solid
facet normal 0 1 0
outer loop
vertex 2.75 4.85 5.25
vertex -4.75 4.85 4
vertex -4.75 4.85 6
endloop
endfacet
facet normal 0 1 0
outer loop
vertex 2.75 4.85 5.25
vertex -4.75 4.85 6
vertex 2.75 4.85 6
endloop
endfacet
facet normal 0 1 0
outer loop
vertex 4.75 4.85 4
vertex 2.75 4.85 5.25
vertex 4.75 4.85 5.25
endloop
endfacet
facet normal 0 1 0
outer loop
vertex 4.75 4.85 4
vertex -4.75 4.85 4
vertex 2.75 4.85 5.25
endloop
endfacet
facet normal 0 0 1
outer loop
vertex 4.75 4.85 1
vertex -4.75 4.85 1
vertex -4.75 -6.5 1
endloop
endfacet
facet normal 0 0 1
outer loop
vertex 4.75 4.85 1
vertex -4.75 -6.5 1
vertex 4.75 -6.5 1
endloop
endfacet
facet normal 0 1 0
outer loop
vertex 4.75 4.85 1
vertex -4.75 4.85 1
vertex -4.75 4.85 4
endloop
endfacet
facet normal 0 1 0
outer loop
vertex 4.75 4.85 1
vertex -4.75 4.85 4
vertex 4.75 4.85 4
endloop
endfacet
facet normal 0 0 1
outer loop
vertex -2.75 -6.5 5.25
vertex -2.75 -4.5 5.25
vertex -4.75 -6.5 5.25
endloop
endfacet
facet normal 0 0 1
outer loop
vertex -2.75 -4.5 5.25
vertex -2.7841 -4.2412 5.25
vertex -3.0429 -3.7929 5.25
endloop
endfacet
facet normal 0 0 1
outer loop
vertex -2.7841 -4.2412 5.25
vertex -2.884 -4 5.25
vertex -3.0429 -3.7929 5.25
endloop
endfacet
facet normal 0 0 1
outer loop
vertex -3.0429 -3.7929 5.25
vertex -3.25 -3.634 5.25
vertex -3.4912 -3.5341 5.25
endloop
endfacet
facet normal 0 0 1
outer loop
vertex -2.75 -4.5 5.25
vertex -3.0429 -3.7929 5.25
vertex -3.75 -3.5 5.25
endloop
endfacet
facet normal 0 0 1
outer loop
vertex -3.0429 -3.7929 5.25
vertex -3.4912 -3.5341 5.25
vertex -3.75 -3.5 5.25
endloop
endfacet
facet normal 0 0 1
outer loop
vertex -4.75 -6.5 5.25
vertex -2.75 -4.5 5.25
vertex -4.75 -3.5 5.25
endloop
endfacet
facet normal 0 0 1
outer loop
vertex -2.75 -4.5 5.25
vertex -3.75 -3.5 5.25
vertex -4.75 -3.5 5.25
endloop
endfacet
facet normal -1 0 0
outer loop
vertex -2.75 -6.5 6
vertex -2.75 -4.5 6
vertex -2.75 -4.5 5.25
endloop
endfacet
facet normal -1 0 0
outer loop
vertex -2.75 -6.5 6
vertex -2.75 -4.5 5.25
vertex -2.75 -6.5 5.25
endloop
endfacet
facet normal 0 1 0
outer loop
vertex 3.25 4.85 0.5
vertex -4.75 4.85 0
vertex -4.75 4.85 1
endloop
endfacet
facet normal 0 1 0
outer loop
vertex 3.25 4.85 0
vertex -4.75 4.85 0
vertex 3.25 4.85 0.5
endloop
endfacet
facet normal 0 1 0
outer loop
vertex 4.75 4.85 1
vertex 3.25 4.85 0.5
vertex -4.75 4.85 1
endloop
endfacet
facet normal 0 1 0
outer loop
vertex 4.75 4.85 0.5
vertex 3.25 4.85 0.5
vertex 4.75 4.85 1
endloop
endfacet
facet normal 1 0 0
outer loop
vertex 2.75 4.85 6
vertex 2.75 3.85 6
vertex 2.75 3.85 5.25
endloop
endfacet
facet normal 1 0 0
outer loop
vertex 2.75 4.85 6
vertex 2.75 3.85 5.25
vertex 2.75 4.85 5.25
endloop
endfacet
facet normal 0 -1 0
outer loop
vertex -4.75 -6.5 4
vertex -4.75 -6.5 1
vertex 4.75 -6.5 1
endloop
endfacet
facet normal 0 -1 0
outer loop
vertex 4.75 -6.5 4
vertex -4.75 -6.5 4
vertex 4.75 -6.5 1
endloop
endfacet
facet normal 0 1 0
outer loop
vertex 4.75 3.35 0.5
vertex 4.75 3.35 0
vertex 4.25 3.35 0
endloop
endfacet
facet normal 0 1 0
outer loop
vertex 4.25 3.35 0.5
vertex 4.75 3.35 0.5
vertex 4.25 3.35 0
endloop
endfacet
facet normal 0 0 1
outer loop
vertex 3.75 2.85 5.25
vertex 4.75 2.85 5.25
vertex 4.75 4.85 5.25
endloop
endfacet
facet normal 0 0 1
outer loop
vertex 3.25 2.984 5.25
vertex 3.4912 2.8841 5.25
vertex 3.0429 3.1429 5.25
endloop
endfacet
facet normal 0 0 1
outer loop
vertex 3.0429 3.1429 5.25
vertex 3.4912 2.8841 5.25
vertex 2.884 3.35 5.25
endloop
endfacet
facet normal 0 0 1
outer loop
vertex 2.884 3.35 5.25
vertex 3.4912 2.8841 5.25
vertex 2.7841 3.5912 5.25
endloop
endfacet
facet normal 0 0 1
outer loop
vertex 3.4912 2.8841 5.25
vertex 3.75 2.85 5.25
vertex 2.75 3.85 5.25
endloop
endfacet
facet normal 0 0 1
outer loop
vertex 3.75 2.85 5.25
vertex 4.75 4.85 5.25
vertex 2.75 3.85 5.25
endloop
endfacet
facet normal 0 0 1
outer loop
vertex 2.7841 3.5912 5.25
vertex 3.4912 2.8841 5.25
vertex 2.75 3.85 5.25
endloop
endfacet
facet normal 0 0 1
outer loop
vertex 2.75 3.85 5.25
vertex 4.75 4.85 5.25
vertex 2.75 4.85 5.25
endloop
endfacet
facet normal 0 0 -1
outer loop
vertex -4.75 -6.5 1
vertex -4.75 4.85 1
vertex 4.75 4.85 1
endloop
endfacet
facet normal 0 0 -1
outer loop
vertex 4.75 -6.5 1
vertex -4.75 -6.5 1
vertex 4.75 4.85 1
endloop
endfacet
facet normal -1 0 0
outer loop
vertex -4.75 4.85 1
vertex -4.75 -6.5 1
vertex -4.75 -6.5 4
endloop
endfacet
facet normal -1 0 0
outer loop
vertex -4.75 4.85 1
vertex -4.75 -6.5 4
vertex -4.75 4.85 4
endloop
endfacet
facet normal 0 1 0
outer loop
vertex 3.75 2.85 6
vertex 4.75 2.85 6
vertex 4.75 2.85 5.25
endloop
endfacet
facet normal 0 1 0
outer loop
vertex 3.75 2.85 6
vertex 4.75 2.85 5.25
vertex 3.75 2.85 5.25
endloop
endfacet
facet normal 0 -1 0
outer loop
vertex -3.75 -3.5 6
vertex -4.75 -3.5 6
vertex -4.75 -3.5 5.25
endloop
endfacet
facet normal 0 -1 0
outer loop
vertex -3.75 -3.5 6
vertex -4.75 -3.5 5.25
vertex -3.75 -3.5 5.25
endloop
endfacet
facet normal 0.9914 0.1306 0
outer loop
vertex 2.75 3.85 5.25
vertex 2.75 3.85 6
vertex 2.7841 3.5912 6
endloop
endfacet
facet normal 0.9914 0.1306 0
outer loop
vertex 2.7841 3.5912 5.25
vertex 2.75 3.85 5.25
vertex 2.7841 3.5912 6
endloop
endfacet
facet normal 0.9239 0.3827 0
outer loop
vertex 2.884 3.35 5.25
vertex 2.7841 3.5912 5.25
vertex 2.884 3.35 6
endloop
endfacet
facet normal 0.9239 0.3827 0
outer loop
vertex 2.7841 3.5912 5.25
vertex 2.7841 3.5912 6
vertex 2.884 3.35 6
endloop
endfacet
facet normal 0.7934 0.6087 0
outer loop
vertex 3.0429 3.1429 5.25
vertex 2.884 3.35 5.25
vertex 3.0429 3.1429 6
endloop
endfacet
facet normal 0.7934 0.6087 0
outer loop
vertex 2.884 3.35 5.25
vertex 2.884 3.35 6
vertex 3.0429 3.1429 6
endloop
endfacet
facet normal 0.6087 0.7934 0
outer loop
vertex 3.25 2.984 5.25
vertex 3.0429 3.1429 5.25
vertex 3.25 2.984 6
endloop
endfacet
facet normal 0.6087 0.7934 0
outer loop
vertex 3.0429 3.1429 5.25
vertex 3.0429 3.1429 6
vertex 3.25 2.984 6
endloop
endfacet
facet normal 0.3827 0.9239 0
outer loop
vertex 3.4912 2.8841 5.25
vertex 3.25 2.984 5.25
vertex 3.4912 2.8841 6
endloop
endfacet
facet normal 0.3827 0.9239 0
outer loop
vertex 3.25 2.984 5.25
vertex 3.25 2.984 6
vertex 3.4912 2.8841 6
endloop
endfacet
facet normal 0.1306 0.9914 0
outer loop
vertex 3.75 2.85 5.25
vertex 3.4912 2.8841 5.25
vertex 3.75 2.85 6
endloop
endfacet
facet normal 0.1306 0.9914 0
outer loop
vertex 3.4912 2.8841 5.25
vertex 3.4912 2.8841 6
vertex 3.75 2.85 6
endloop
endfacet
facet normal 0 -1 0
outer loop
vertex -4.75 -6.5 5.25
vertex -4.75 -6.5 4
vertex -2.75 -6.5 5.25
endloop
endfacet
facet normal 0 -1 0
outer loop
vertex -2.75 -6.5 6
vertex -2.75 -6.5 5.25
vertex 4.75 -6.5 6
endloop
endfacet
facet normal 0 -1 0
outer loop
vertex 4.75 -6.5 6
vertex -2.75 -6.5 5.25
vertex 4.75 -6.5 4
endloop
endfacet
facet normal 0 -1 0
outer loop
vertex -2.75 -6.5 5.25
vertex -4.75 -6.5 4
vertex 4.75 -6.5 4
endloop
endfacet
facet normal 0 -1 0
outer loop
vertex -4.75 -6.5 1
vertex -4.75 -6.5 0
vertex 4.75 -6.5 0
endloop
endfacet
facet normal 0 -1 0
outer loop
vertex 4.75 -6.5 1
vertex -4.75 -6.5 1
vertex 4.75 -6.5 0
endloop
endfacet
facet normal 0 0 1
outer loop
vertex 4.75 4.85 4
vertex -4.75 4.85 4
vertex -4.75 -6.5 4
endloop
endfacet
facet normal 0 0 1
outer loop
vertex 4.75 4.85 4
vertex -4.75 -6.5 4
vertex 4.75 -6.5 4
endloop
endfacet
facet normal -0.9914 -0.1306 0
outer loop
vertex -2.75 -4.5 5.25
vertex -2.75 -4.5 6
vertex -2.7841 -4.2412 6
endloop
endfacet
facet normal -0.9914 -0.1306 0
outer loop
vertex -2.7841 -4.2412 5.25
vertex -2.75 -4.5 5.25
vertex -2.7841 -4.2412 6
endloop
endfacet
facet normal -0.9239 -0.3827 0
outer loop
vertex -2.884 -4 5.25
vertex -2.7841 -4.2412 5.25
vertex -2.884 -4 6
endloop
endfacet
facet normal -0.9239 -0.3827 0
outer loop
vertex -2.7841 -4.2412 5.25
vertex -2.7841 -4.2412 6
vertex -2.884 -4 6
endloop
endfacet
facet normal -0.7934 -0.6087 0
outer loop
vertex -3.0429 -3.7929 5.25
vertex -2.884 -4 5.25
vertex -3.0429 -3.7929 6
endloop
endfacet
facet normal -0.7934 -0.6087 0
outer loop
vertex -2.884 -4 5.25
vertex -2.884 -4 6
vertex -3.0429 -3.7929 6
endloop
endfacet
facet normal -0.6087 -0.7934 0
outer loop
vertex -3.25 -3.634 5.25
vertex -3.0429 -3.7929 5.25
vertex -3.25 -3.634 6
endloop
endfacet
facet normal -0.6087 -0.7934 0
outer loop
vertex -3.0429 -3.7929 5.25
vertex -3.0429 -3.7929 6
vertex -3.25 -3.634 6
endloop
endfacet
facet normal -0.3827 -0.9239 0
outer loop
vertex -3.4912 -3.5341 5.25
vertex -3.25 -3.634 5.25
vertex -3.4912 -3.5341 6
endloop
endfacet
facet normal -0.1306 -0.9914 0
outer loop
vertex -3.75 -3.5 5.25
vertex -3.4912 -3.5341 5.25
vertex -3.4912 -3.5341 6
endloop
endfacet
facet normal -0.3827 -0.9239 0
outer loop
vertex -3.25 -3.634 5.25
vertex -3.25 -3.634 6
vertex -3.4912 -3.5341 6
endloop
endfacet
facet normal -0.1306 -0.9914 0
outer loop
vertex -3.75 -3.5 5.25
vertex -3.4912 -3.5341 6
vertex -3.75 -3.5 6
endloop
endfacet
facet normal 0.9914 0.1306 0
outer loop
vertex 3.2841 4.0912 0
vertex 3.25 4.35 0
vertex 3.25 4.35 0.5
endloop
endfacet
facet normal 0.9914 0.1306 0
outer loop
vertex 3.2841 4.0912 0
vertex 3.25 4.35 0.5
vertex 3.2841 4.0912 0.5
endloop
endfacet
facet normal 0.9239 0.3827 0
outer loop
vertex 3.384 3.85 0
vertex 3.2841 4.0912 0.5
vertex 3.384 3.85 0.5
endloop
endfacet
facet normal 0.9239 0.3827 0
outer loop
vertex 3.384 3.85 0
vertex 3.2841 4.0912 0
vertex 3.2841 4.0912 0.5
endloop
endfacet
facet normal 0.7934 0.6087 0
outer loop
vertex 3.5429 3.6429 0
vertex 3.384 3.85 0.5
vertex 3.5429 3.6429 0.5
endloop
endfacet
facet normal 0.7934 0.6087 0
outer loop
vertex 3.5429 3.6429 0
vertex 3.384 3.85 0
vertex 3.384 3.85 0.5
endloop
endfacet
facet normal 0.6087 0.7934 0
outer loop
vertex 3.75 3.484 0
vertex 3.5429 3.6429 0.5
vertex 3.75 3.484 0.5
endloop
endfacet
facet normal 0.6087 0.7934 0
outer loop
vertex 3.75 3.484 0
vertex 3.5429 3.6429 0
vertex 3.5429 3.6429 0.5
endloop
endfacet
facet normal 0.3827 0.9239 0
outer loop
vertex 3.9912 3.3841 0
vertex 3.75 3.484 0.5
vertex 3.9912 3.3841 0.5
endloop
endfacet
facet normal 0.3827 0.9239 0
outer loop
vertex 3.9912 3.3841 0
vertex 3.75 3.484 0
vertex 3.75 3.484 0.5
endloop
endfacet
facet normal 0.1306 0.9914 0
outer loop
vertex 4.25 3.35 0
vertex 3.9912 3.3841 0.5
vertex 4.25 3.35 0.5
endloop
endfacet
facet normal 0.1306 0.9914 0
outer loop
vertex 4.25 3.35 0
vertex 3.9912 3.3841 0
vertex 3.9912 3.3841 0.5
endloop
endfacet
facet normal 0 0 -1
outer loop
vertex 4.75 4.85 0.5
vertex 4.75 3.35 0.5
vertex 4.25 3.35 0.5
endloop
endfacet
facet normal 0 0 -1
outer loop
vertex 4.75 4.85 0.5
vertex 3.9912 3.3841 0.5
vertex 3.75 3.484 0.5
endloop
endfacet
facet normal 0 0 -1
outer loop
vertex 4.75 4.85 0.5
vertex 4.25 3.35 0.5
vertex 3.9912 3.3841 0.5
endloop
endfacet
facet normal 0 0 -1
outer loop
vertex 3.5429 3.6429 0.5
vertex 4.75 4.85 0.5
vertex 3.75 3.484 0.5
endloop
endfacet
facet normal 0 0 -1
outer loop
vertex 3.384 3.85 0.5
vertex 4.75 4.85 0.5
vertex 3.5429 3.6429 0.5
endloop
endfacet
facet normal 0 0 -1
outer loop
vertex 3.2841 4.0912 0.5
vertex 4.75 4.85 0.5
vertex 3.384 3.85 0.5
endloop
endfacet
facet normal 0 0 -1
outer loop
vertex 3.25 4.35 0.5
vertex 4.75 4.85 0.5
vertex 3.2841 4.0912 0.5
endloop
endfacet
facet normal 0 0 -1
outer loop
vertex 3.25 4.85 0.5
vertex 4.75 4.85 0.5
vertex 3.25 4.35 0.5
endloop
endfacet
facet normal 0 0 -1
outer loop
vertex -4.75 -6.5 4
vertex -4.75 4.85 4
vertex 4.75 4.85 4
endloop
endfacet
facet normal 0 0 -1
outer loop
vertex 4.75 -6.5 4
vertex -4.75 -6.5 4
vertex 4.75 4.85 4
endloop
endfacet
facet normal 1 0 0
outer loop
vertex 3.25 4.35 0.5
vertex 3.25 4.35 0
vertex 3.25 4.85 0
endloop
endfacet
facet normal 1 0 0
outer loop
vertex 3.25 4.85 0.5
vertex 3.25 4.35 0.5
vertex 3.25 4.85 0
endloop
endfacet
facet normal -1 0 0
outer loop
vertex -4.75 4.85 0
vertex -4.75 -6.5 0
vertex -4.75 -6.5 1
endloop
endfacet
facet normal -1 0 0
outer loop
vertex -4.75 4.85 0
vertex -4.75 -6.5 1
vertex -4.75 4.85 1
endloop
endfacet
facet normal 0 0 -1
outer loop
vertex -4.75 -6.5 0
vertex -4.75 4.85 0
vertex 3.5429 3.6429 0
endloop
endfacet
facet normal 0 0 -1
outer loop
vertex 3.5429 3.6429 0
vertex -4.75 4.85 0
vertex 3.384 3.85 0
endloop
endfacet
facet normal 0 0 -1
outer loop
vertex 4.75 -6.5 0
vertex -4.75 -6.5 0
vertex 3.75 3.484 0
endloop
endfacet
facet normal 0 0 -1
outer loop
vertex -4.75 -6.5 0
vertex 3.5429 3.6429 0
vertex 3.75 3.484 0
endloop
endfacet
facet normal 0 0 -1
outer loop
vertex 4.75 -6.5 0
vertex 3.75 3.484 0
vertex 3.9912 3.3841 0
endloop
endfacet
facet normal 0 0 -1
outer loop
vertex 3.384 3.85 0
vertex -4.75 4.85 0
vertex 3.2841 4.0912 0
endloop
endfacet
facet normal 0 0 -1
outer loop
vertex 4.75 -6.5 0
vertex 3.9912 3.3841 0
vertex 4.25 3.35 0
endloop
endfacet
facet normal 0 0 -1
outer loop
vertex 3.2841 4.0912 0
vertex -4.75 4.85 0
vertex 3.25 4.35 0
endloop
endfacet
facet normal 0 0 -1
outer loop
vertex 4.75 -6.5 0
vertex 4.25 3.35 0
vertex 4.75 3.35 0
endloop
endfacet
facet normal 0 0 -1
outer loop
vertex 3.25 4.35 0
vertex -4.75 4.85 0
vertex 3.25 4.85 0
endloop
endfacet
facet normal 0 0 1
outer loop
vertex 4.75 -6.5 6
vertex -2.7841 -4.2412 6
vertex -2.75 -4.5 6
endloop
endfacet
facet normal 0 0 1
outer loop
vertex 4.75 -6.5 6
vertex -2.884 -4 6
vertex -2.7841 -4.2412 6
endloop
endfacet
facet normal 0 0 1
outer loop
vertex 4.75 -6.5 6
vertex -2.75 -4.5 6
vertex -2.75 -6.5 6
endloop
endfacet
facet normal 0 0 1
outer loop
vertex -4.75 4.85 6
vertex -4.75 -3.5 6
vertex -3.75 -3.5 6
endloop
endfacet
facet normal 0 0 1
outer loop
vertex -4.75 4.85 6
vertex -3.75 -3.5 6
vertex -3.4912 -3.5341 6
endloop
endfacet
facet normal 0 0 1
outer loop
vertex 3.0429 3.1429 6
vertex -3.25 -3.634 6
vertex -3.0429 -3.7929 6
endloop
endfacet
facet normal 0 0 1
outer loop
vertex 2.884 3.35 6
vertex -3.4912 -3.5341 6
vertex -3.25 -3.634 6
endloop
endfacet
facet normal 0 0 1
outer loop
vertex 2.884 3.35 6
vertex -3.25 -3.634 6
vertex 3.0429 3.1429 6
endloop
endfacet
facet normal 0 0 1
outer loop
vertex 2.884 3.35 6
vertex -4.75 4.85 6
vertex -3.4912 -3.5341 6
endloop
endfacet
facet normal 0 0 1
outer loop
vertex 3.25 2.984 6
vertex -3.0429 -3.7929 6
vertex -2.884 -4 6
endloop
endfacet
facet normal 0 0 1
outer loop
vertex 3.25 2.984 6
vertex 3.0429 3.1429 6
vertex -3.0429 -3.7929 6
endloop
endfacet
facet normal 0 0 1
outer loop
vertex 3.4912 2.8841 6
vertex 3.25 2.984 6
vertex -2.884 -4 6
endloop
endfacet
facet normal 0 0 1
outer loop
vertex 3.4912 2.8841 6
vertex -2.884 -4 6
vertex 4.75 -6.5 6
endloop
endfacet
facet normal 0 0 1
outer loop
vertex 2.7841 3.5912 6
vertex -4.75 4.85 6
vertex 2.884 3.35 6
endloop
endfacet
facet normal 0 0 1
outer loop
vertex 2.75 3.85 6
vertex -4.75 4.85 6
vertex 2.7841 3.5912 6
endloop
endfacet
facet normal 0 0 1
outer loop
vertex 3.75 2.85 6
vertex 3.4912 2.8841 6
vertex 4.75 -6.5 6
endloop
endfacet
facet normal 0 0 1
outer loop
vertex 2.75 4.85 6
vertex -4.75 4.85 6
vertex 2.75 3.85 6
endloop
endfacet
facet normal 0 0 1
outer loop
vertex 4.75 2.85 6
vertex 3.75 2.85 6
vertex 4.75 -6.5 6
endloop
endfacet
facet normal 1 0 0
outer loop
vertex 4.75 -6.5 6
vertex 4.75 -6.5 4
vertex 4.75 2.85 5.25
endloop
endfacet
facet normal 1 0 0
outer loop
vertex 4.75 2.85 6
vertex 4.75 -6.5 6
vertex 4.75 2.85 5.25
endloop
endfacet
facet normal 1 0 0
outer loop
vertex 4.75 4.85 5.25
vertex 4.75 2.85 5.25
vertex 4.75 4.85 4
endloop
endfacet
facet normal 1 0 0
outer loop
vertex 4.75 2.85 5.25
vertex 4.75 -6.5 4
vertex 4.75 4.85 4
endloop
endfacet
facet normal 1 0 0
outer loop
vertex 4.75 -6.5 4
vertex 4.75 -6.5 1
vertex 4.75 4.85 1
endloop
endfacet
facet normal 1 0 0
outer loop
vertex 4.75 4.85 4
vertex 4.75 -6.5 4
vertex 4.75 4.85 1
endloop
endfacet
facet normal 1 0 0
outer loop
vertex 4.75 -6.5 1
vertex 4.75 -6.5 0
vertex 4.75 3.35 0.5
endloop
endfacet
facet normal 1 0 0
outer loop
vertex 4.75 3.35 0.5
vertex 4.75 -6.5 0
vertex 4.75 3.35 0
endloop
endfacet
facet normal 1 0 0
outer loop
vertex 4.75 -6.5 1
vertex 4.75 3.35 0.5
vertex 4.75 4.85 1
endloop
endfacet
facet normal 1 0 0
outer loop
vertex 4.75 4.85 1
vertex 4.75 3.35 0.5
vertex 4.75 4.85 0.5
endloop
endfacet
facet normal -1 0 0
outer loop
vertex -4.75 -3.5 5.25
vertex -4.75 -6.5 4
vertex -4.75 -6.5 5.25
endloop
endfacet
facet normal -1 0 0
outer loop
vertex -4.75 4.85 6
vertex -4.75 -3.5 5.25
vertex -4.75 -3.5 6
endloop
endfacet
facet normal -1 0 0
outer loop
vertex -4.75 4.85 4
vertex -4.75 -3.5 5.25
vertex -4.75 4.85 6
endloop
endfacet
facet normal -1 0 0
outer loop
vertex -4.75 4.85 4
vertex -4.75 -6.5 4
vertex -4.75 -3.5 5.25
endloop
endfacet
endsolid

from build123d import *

# Parameters (mm, degrees)
SKETCH_W        = 9.5
SKETCH_H        = 11.35
PAD_DEPTH       = 1
POCKET002_DEPTH = 0.5
SKETCH002_W     = 9.5
SKETCH002_H     = 11.35
PAD001_DEPTH    = 3
SKETCH001_W     = 9.5
SKETCH001_H     = 11.35
PAD002_DEPTH    = 2
POCKET_DEPTH    = 0.75
POCKET001_DEPTH = 0.75


with BuildPart() as housing_bottom:
    # Sketch → Pad (new body)
    with BuildSketch(Plane.XY):
        with Locations((0, -0.825)):
            Rectangle(SKETCH_W, SKETCH_H)
    extrude(amount=PAD_DEPTH)

    # Sketch005 → Pocket002 (cut)
    with BuildSketch(Plane.XY):
        with BuildLine():
            Line((3.25, 4.85), (4.75, 4.85))
            Line((4.75, 4.85), (4.75, 3.35))
            Line((4.75, 3.35), (4.25, 3.35))
            ThreePointArc((3.25, 4.35), (3.542893, 3.642893), (4.25, 3.35))
            Line((3.25, 4.35), (3.25, 4.85))
        make_face()
    extrude(amount=POCKET002_DEPTH, mode=Mode.SUBTRACT)


with BuildPart() as housing_middle:
    # Sketch002 → Pad001 (new body)
    with BuildSketch(Plane.XY.offset(1)):
        with Locations((0, -0.825)):
            Rectangle(SKETCH002_W, SKETCH002_H)
    extrude(amount=PAD001_DEPTH)


with BuildPart() as housing_top:
    # Sketch001 → Pad002 (new body)
    with BuildSketch(Plane.XY.offset(4)):
        with Locations((0, -0.825)):
            Rectangle(SKETCH001_W, SKETCH001_H)
    extrude(amount=PAD002_DEPTH)

    # Sketch003 → Pocket (cut)
    with BuildSketch(Plane.XY.offset(6)):
        with BuildLine():
            Line((2.75, 4.85), (4.75, 4.85))
            Line((4.75, 4.85), (4.75, 2.85))
            Line((4.75, 2.85), (3.75, 2.85))
            ThreePointArc((2.75, 3.85), (3.042893, 3.142893), (3.75, 2.85))
            Line((2.75, 3.85), (2.75, 4.85))
        make_face()
    extrude(amount=-POCKET_DEPTH, mode=Mode.SUBTRACT)

    # Sketch004 → Pocket001 (cut)
    with BuildSketch(Plane.XY.offset(6)):
        with BuildLine():
            Line((-4.75, -3.5), (-3.75, -3.5))
            ThreePointArc((-2.75, -4.5), (-3.042893, -3.792893), (-3.75, -3.5))
            Line((-2.75, -4.5), (-2.75, -6.5))
            Line((-2.75, -6.5), (-4.75, -6.5))
            Line((-4.75, -6.5), (-4.75, -3.5))
        make_face()
    extrude(amount=-POCKET001_DEPTH, mode=Mode.SUBTRACT)


solid = Compound([housing_bottom.part, housing_middle.part, housing_top.part])
